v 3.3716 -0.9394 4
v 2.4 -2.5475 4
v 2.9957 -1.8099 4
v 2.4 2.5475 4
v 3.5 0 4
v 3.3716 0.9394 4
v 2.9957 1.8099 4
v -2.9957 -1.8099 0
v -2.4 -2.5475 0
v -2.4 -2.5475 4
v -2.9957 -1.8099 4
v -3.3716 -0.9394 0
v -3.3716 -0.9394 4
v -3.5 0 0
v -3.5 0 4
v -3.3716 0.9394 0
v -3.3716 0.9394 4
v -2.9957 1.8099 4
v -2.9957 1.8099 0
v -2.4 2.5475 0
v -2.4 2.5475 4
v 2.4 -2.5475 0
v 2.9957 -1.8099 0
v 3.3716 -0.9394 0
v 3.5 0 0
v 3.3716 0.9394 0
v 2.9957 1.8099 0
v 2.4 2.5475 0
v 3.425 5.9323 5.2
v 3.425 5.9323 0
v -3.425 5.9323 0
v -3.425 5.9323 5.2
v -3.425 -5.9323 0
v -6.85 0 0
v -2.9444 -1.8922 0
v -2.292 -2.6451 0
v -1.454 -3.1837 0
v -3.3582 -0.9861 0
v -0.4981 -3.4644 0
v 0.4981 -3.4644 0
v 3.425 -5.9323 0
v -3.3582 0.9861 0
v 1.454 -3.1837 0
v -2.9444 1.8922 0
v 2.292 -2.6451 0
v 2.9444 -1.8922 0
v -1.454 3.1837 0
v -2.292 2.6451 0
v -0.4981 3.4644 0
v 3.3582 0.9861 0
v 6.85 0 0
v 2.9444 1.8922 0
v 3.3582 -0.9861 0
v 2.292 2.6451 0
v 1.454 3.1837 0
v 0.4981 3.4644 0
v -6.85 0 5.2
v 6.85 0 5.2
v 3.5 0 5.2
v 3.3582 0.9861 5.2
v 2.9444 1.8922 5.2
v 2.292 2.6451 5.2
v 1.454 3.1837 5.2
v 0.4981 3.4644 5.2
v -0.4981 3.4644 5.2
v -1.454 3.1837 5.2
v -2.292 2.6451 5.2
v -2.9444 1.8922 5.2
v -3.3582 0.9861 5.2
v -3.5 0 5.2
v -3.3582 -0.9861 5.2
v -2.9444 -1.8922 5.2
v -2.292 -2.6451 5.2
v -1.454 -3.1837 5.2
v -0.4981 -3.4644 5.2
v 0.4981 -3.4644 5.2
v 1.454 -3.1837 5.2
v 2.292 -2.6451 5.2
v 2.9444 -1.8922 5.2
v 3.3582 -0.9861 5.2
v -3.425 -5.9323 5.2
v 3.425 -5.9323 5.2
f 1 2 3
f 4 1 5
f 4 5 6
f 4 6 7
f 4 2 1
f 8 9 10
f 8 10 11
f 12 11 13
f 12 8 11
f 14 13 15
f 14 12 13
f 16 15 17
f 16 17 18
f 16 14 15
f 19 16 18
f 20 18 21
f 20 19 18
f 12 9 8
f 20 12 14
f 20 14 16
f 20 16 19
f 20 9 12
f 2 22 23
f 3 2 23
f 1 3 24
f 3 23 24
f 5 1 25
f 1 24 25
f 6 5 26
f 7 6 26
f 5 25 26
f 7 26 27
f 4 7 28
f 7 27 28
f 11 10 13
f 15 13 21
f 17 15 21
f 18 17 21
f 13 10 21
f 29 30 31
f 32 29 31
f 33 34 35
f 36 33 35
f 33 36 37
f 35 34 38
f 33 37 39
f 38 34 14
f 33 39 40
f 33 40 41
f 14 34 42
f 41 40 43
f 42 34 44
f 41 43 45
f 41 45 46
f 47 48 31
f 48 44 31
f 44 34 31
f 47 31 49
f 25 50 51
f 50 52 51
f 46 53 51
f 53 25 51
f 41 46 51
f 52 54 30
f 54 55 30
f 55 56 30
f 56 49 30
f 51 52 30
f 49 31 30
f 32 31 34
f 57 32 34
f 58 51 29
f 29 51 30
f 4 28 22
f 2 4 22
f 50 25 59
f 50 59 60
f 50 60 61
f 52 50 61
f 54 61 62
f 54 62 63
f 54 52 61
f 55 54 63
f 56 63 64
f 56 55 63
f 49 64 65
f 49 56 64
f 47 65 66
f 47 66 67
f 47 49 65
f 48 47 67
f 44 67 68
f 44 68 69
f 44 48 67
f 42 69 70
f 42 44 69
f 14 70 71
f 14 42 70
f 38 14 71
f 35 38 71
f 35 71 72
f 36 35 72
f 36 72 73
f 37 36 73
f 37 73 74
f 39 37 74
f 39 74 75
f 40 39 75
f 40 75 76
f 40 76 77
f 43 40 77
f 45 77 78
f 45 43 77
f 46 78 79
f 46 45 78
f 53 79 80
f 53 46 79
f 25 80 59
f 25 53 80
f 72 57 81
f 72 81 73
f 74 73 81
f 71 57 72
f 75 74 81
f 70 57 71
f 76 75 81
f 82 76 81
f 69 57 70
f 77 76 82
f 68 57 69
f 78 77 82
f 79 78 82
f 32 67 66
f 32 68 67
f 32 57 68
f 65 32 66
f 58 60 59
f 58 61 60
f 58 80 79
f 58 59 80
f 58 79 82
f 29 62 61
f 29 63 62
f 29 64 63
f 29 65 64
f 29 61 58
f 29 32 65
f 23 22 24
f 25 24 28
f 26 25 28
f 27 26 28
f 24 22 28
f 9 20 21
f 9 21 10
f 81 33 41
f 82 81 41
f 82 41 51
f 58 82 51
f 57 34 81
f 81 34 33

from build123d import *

# Parameters (mm, degrees)
SKETCH1_R             = 3.5
BOSS_EXTRUDE1_DEPTH   = 5.2
BOSS_EXTRUDE2_DEPTH   = 4
BOSS_EXTRUDE2_2_DEPTH = 4


with BuildPart() as part:
    # Sketch1 → Boss-Extrude1 (new body)
    with BuildSketch(Plane.XY):
        Polygon((6.85, 0), (3.425, 5.932274016), (-3.425, 5.932274016), (-6.85, 0), (-3.425, -5.932274016), (3.425, -5.932274016), align=None)
        Circle(SKETCH1_R, mode=Mode.SUBTRACT)
    extrude(amount=BOSS_EXTRUDE1_DEPTH)


with BuildPart() as body_2:
    # Sketch2 → Boss-Extrude2 (new body)
    with BuildSketch(Plane(origin=(0, 0, 0), x_dir=(-1, 0, 0), z_dir=(0, 0, -1))):
        with BuildLine():
            Line((2.4, 2.547547841), (2.4, -2.547547841))
            ThreePointArc((2.4, -2.547547841), (3.5, 0), (2.4, 2.547547841))
        make_face()
    extrude(amount=-BOSS_EXTRUDE2_DEPTH)


with BuildPart() as body_3:
    # Sketch2 → Boss-Extrude2 2 (new body)
    with BuildSketch(Plane(origin=(0, 0, 0), x_dir=(-1, 0, 0), z_dir=(0, 0, -1))):
        with BuildLine():
            Line((-2.4, 2.547547841), (-2.4, -2.547547841))
            ThreePointArc((-2.4, -2.547547841), (-3.5, 0), (-2.4, 2.547547841))
        make_face()
    extrude(amount=-BOSS_EXTRUDE2_2_DEPTH)


solid = Compound([part.part, body_2.part, body_3.part])
